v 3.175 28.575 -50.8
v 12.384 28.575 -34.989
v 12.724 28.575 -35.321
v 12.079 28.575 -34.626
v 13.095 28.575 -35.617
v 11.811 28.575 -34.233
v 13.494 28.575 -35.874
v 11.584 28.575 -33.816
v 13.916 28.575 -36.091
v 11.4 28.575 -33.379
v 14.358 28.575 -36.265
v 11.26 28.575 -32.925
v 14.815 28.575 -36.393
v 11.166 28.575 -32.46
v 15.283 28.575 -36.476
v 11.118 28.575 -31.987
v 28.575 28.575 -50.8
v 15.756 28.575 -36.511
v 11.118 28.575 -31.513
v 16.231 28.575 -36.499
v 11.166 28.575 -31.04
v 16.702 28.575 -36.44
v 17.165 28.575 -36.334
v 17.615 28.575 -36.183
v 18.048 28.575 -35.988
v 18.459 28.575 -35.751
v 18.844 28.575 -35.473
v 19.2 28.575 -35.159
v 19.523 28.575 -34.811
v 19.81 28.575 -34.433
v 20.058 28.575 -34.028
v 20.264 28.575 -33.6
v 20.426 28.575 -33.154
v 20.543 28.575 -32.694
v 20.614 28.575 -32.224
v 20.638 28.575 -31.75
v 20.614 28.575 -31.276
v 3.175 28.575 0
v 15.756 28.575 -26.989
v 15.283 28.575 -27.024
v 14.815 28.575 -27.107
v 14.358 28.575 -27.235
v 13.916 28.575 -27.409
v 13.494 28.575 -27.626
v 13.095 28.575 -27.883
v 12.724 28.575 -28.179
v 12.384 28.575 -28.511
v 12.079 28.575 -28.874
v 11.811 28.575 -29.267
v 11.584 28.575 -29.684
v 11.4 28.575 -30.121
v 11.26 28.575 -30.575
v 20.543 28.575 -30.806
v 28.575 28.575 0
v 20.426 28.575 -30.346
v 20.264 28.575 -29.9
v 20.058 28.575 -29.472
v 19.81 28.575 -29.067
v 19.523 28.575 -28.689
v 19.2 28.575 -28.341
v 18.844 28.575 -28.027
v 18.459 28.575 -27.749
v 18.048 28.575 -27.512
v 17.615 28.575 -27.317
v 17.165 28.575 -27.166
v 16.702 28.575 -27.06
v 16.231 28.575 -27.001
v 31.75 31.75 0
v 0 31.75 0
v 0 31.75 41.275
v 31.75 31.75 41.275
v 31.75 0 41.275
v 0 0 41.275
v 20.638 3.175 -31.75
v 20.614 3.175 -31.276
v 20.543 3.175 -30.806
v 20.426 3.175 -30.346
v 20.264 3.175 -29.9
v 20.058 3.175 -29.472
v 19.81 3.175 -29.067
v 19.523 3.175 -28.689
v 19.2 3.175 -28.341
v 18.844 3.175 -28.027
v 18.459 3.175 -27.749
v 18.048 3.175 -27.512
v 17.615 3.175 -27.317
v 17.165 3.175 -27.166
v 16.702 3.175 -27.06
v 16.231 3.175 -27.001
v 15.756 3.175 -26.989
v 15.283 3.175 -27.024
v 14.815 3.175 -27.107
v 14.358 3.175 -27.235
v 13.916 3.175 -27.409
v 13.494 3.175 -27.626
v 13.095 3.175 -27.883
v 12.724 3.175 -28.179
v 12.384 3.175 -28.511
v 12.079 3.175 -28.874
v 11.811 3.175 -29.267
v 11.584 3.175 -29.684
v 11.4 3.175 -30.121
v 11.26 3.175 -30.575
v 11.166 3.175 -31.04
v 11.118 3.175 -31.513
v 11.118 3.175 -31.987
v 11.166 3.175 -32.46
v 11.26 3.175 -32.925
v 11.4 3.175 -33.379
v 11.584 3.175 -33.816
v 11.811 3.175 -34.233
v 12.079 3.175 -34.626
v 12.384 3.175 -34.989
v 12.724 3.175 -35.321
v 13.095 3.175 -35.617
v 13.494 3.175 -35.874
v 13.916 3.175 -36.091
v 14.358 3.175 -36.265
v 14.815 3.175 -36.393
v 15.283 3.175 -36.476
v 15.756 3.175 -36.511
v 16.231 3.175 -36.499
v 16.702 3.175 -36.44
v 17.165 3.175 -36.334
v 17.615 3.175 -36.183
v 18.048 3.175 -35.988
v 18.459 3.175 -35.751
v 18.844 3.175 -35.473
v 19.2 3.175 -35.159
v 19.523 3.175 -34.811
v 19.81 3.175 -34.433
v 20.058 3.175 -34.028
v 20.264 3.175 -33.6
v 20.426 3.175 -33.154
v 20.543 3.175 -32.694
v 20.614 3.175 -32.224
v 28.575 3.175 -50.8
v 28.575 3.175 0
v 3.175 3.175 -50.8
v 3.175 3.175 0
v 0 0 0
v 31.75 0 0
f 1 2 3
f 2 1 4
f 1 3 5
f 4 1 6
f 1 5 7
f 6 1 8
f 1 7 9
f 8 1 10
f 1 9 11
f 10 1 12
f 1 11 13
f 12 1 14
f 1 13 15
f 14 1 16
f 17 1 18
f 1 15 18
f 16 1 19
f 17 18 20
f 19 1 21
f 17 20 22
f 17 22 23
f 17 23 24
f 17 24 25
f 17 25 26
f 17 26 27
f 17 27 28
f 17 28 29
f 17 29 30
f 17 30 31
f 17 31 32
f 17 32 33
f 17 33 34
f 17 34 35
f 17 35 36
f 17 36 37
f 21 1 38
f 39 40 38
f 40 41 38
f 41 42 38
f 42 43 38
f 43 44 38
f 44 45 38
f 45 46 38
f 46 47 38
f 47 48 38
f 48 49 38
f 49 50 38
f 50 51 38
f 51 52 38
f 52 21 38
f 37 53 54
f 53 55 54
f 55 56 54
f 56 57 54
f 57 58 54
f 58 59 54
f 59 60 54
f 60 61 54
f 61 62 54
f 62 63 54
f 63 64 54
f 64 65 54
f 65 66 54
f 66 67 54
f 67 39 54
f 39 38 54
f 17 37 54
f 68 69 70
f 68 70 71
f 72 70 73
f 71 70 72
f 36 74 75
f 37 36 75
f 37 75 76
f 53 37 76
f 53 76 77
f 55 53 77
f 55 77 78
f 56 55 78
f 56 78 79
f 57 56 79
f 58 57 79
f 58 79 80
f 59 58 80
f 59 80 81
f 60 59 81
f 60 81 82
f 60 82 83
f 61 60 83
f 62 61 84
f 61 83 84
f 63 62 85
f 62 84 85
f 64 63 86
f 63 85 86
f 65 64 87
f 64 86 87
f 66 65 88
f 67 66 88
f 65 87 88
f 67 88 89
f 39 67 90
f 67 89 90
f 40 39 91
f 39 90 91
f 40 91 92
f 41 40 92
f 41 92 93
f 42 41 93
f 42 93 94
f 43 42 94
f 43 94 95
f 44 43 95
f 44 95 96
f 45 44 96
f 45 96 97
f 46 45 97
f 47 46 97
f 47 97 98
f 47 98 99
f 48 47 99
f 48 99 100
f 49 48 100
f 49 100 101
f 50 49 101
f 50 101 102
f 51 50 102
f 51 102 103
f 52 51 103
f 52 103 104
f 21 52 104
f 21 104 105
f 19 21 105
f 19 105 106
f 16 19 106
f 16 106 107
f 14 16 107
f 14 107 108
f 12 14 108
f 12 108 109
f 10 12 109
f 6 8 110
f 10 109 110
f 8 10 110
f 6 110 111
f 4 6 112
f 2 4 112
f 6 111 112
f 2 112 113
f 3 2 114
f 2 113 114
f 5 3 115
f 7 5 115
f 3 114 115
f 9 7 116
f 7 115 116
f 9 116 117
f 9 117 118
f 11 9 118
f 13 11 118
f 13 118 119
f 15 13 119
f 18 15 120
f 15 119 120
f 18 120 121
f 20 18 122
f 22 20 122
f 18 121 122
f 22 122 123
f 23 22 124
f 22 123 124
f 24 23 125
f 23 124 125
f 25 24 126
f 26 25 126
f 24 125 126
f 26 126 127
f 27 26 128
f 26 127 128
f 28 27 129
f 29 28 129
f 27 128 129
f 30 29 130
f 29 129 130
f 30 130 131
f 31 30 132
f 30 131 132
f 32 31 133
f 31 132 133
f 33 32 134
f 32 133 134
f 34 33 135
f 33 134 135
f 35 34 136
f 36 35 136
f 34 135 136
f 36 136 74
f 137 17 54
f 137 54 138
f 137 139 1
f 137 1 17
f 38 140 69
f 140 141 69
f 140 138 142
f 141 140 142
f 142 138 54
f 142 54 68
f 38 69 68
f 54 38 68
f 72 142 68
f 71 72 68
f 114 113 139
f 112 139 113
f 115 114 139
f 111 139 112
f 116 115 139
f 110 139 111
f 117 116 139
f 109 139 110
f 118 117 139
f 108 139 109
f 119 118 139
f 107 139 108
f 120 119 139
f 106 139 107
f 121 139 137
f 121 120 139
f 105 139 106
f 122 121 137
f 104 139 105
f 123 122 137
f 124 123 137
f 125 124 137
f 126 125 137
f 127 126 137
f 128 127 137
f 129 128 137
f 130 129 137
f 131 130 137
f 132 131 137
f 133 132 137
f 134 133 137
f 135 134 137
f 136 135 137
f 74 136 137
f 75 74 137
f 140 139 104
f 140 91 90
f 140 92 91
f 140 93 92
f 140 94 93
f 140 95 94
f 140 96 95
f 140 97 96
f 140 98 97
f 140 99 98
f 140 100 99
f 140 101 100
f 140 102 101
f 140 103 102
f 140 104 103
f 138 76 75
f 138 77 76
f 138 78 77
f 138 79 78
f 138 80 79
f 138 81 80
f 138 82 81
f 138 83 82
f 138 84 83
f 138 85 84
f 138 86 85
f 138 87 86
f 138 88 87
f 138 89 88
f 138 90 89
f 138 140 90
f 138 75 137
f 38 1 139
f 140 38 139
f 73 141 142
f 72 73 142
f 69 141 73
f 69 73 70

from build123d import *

# Parameters (mm, degrees)
F0_W     = 31.75
F0_H     = 31.75
F1_DEPTH = 41.275
F2_W     = 25.4
F2_H     = 25.4
F3_DEPTH = 50.8
F4_R     = 4.7625
F5_DEPTH = 28.576


with BuildPart() as f1:
    # F0 (on Top) → F1 (new body)
    with BuildSketch(Plane.XY):
        with Locations((15.875, 15.875)):
            Rectangle(F0_W, F0_H)
    extrude(amount=F1_DEPTH)

    # F2 (on face) → F3 (join)
    with BuildSketch(Plane(origin=(0, 0, 0), x_dir=(1, 0, 0), z_dir=(0, 0, -1))):
        with Locations((15.875, -15.875)):
            Rectangle(F2_W, F2_H)
    extrude(amount=F3_DEPTH)

    # F4 (on face) → F5 (cut, through all)
    with BuildSketch(Plane.XZ.offset(-3.175)):
        with Locations((15.875, -31.75)):
            Circle(F4_R)
    extrude(amount=-F5_DEPTH, mode=Mode.SUBTRACT)


solid = f1.part
